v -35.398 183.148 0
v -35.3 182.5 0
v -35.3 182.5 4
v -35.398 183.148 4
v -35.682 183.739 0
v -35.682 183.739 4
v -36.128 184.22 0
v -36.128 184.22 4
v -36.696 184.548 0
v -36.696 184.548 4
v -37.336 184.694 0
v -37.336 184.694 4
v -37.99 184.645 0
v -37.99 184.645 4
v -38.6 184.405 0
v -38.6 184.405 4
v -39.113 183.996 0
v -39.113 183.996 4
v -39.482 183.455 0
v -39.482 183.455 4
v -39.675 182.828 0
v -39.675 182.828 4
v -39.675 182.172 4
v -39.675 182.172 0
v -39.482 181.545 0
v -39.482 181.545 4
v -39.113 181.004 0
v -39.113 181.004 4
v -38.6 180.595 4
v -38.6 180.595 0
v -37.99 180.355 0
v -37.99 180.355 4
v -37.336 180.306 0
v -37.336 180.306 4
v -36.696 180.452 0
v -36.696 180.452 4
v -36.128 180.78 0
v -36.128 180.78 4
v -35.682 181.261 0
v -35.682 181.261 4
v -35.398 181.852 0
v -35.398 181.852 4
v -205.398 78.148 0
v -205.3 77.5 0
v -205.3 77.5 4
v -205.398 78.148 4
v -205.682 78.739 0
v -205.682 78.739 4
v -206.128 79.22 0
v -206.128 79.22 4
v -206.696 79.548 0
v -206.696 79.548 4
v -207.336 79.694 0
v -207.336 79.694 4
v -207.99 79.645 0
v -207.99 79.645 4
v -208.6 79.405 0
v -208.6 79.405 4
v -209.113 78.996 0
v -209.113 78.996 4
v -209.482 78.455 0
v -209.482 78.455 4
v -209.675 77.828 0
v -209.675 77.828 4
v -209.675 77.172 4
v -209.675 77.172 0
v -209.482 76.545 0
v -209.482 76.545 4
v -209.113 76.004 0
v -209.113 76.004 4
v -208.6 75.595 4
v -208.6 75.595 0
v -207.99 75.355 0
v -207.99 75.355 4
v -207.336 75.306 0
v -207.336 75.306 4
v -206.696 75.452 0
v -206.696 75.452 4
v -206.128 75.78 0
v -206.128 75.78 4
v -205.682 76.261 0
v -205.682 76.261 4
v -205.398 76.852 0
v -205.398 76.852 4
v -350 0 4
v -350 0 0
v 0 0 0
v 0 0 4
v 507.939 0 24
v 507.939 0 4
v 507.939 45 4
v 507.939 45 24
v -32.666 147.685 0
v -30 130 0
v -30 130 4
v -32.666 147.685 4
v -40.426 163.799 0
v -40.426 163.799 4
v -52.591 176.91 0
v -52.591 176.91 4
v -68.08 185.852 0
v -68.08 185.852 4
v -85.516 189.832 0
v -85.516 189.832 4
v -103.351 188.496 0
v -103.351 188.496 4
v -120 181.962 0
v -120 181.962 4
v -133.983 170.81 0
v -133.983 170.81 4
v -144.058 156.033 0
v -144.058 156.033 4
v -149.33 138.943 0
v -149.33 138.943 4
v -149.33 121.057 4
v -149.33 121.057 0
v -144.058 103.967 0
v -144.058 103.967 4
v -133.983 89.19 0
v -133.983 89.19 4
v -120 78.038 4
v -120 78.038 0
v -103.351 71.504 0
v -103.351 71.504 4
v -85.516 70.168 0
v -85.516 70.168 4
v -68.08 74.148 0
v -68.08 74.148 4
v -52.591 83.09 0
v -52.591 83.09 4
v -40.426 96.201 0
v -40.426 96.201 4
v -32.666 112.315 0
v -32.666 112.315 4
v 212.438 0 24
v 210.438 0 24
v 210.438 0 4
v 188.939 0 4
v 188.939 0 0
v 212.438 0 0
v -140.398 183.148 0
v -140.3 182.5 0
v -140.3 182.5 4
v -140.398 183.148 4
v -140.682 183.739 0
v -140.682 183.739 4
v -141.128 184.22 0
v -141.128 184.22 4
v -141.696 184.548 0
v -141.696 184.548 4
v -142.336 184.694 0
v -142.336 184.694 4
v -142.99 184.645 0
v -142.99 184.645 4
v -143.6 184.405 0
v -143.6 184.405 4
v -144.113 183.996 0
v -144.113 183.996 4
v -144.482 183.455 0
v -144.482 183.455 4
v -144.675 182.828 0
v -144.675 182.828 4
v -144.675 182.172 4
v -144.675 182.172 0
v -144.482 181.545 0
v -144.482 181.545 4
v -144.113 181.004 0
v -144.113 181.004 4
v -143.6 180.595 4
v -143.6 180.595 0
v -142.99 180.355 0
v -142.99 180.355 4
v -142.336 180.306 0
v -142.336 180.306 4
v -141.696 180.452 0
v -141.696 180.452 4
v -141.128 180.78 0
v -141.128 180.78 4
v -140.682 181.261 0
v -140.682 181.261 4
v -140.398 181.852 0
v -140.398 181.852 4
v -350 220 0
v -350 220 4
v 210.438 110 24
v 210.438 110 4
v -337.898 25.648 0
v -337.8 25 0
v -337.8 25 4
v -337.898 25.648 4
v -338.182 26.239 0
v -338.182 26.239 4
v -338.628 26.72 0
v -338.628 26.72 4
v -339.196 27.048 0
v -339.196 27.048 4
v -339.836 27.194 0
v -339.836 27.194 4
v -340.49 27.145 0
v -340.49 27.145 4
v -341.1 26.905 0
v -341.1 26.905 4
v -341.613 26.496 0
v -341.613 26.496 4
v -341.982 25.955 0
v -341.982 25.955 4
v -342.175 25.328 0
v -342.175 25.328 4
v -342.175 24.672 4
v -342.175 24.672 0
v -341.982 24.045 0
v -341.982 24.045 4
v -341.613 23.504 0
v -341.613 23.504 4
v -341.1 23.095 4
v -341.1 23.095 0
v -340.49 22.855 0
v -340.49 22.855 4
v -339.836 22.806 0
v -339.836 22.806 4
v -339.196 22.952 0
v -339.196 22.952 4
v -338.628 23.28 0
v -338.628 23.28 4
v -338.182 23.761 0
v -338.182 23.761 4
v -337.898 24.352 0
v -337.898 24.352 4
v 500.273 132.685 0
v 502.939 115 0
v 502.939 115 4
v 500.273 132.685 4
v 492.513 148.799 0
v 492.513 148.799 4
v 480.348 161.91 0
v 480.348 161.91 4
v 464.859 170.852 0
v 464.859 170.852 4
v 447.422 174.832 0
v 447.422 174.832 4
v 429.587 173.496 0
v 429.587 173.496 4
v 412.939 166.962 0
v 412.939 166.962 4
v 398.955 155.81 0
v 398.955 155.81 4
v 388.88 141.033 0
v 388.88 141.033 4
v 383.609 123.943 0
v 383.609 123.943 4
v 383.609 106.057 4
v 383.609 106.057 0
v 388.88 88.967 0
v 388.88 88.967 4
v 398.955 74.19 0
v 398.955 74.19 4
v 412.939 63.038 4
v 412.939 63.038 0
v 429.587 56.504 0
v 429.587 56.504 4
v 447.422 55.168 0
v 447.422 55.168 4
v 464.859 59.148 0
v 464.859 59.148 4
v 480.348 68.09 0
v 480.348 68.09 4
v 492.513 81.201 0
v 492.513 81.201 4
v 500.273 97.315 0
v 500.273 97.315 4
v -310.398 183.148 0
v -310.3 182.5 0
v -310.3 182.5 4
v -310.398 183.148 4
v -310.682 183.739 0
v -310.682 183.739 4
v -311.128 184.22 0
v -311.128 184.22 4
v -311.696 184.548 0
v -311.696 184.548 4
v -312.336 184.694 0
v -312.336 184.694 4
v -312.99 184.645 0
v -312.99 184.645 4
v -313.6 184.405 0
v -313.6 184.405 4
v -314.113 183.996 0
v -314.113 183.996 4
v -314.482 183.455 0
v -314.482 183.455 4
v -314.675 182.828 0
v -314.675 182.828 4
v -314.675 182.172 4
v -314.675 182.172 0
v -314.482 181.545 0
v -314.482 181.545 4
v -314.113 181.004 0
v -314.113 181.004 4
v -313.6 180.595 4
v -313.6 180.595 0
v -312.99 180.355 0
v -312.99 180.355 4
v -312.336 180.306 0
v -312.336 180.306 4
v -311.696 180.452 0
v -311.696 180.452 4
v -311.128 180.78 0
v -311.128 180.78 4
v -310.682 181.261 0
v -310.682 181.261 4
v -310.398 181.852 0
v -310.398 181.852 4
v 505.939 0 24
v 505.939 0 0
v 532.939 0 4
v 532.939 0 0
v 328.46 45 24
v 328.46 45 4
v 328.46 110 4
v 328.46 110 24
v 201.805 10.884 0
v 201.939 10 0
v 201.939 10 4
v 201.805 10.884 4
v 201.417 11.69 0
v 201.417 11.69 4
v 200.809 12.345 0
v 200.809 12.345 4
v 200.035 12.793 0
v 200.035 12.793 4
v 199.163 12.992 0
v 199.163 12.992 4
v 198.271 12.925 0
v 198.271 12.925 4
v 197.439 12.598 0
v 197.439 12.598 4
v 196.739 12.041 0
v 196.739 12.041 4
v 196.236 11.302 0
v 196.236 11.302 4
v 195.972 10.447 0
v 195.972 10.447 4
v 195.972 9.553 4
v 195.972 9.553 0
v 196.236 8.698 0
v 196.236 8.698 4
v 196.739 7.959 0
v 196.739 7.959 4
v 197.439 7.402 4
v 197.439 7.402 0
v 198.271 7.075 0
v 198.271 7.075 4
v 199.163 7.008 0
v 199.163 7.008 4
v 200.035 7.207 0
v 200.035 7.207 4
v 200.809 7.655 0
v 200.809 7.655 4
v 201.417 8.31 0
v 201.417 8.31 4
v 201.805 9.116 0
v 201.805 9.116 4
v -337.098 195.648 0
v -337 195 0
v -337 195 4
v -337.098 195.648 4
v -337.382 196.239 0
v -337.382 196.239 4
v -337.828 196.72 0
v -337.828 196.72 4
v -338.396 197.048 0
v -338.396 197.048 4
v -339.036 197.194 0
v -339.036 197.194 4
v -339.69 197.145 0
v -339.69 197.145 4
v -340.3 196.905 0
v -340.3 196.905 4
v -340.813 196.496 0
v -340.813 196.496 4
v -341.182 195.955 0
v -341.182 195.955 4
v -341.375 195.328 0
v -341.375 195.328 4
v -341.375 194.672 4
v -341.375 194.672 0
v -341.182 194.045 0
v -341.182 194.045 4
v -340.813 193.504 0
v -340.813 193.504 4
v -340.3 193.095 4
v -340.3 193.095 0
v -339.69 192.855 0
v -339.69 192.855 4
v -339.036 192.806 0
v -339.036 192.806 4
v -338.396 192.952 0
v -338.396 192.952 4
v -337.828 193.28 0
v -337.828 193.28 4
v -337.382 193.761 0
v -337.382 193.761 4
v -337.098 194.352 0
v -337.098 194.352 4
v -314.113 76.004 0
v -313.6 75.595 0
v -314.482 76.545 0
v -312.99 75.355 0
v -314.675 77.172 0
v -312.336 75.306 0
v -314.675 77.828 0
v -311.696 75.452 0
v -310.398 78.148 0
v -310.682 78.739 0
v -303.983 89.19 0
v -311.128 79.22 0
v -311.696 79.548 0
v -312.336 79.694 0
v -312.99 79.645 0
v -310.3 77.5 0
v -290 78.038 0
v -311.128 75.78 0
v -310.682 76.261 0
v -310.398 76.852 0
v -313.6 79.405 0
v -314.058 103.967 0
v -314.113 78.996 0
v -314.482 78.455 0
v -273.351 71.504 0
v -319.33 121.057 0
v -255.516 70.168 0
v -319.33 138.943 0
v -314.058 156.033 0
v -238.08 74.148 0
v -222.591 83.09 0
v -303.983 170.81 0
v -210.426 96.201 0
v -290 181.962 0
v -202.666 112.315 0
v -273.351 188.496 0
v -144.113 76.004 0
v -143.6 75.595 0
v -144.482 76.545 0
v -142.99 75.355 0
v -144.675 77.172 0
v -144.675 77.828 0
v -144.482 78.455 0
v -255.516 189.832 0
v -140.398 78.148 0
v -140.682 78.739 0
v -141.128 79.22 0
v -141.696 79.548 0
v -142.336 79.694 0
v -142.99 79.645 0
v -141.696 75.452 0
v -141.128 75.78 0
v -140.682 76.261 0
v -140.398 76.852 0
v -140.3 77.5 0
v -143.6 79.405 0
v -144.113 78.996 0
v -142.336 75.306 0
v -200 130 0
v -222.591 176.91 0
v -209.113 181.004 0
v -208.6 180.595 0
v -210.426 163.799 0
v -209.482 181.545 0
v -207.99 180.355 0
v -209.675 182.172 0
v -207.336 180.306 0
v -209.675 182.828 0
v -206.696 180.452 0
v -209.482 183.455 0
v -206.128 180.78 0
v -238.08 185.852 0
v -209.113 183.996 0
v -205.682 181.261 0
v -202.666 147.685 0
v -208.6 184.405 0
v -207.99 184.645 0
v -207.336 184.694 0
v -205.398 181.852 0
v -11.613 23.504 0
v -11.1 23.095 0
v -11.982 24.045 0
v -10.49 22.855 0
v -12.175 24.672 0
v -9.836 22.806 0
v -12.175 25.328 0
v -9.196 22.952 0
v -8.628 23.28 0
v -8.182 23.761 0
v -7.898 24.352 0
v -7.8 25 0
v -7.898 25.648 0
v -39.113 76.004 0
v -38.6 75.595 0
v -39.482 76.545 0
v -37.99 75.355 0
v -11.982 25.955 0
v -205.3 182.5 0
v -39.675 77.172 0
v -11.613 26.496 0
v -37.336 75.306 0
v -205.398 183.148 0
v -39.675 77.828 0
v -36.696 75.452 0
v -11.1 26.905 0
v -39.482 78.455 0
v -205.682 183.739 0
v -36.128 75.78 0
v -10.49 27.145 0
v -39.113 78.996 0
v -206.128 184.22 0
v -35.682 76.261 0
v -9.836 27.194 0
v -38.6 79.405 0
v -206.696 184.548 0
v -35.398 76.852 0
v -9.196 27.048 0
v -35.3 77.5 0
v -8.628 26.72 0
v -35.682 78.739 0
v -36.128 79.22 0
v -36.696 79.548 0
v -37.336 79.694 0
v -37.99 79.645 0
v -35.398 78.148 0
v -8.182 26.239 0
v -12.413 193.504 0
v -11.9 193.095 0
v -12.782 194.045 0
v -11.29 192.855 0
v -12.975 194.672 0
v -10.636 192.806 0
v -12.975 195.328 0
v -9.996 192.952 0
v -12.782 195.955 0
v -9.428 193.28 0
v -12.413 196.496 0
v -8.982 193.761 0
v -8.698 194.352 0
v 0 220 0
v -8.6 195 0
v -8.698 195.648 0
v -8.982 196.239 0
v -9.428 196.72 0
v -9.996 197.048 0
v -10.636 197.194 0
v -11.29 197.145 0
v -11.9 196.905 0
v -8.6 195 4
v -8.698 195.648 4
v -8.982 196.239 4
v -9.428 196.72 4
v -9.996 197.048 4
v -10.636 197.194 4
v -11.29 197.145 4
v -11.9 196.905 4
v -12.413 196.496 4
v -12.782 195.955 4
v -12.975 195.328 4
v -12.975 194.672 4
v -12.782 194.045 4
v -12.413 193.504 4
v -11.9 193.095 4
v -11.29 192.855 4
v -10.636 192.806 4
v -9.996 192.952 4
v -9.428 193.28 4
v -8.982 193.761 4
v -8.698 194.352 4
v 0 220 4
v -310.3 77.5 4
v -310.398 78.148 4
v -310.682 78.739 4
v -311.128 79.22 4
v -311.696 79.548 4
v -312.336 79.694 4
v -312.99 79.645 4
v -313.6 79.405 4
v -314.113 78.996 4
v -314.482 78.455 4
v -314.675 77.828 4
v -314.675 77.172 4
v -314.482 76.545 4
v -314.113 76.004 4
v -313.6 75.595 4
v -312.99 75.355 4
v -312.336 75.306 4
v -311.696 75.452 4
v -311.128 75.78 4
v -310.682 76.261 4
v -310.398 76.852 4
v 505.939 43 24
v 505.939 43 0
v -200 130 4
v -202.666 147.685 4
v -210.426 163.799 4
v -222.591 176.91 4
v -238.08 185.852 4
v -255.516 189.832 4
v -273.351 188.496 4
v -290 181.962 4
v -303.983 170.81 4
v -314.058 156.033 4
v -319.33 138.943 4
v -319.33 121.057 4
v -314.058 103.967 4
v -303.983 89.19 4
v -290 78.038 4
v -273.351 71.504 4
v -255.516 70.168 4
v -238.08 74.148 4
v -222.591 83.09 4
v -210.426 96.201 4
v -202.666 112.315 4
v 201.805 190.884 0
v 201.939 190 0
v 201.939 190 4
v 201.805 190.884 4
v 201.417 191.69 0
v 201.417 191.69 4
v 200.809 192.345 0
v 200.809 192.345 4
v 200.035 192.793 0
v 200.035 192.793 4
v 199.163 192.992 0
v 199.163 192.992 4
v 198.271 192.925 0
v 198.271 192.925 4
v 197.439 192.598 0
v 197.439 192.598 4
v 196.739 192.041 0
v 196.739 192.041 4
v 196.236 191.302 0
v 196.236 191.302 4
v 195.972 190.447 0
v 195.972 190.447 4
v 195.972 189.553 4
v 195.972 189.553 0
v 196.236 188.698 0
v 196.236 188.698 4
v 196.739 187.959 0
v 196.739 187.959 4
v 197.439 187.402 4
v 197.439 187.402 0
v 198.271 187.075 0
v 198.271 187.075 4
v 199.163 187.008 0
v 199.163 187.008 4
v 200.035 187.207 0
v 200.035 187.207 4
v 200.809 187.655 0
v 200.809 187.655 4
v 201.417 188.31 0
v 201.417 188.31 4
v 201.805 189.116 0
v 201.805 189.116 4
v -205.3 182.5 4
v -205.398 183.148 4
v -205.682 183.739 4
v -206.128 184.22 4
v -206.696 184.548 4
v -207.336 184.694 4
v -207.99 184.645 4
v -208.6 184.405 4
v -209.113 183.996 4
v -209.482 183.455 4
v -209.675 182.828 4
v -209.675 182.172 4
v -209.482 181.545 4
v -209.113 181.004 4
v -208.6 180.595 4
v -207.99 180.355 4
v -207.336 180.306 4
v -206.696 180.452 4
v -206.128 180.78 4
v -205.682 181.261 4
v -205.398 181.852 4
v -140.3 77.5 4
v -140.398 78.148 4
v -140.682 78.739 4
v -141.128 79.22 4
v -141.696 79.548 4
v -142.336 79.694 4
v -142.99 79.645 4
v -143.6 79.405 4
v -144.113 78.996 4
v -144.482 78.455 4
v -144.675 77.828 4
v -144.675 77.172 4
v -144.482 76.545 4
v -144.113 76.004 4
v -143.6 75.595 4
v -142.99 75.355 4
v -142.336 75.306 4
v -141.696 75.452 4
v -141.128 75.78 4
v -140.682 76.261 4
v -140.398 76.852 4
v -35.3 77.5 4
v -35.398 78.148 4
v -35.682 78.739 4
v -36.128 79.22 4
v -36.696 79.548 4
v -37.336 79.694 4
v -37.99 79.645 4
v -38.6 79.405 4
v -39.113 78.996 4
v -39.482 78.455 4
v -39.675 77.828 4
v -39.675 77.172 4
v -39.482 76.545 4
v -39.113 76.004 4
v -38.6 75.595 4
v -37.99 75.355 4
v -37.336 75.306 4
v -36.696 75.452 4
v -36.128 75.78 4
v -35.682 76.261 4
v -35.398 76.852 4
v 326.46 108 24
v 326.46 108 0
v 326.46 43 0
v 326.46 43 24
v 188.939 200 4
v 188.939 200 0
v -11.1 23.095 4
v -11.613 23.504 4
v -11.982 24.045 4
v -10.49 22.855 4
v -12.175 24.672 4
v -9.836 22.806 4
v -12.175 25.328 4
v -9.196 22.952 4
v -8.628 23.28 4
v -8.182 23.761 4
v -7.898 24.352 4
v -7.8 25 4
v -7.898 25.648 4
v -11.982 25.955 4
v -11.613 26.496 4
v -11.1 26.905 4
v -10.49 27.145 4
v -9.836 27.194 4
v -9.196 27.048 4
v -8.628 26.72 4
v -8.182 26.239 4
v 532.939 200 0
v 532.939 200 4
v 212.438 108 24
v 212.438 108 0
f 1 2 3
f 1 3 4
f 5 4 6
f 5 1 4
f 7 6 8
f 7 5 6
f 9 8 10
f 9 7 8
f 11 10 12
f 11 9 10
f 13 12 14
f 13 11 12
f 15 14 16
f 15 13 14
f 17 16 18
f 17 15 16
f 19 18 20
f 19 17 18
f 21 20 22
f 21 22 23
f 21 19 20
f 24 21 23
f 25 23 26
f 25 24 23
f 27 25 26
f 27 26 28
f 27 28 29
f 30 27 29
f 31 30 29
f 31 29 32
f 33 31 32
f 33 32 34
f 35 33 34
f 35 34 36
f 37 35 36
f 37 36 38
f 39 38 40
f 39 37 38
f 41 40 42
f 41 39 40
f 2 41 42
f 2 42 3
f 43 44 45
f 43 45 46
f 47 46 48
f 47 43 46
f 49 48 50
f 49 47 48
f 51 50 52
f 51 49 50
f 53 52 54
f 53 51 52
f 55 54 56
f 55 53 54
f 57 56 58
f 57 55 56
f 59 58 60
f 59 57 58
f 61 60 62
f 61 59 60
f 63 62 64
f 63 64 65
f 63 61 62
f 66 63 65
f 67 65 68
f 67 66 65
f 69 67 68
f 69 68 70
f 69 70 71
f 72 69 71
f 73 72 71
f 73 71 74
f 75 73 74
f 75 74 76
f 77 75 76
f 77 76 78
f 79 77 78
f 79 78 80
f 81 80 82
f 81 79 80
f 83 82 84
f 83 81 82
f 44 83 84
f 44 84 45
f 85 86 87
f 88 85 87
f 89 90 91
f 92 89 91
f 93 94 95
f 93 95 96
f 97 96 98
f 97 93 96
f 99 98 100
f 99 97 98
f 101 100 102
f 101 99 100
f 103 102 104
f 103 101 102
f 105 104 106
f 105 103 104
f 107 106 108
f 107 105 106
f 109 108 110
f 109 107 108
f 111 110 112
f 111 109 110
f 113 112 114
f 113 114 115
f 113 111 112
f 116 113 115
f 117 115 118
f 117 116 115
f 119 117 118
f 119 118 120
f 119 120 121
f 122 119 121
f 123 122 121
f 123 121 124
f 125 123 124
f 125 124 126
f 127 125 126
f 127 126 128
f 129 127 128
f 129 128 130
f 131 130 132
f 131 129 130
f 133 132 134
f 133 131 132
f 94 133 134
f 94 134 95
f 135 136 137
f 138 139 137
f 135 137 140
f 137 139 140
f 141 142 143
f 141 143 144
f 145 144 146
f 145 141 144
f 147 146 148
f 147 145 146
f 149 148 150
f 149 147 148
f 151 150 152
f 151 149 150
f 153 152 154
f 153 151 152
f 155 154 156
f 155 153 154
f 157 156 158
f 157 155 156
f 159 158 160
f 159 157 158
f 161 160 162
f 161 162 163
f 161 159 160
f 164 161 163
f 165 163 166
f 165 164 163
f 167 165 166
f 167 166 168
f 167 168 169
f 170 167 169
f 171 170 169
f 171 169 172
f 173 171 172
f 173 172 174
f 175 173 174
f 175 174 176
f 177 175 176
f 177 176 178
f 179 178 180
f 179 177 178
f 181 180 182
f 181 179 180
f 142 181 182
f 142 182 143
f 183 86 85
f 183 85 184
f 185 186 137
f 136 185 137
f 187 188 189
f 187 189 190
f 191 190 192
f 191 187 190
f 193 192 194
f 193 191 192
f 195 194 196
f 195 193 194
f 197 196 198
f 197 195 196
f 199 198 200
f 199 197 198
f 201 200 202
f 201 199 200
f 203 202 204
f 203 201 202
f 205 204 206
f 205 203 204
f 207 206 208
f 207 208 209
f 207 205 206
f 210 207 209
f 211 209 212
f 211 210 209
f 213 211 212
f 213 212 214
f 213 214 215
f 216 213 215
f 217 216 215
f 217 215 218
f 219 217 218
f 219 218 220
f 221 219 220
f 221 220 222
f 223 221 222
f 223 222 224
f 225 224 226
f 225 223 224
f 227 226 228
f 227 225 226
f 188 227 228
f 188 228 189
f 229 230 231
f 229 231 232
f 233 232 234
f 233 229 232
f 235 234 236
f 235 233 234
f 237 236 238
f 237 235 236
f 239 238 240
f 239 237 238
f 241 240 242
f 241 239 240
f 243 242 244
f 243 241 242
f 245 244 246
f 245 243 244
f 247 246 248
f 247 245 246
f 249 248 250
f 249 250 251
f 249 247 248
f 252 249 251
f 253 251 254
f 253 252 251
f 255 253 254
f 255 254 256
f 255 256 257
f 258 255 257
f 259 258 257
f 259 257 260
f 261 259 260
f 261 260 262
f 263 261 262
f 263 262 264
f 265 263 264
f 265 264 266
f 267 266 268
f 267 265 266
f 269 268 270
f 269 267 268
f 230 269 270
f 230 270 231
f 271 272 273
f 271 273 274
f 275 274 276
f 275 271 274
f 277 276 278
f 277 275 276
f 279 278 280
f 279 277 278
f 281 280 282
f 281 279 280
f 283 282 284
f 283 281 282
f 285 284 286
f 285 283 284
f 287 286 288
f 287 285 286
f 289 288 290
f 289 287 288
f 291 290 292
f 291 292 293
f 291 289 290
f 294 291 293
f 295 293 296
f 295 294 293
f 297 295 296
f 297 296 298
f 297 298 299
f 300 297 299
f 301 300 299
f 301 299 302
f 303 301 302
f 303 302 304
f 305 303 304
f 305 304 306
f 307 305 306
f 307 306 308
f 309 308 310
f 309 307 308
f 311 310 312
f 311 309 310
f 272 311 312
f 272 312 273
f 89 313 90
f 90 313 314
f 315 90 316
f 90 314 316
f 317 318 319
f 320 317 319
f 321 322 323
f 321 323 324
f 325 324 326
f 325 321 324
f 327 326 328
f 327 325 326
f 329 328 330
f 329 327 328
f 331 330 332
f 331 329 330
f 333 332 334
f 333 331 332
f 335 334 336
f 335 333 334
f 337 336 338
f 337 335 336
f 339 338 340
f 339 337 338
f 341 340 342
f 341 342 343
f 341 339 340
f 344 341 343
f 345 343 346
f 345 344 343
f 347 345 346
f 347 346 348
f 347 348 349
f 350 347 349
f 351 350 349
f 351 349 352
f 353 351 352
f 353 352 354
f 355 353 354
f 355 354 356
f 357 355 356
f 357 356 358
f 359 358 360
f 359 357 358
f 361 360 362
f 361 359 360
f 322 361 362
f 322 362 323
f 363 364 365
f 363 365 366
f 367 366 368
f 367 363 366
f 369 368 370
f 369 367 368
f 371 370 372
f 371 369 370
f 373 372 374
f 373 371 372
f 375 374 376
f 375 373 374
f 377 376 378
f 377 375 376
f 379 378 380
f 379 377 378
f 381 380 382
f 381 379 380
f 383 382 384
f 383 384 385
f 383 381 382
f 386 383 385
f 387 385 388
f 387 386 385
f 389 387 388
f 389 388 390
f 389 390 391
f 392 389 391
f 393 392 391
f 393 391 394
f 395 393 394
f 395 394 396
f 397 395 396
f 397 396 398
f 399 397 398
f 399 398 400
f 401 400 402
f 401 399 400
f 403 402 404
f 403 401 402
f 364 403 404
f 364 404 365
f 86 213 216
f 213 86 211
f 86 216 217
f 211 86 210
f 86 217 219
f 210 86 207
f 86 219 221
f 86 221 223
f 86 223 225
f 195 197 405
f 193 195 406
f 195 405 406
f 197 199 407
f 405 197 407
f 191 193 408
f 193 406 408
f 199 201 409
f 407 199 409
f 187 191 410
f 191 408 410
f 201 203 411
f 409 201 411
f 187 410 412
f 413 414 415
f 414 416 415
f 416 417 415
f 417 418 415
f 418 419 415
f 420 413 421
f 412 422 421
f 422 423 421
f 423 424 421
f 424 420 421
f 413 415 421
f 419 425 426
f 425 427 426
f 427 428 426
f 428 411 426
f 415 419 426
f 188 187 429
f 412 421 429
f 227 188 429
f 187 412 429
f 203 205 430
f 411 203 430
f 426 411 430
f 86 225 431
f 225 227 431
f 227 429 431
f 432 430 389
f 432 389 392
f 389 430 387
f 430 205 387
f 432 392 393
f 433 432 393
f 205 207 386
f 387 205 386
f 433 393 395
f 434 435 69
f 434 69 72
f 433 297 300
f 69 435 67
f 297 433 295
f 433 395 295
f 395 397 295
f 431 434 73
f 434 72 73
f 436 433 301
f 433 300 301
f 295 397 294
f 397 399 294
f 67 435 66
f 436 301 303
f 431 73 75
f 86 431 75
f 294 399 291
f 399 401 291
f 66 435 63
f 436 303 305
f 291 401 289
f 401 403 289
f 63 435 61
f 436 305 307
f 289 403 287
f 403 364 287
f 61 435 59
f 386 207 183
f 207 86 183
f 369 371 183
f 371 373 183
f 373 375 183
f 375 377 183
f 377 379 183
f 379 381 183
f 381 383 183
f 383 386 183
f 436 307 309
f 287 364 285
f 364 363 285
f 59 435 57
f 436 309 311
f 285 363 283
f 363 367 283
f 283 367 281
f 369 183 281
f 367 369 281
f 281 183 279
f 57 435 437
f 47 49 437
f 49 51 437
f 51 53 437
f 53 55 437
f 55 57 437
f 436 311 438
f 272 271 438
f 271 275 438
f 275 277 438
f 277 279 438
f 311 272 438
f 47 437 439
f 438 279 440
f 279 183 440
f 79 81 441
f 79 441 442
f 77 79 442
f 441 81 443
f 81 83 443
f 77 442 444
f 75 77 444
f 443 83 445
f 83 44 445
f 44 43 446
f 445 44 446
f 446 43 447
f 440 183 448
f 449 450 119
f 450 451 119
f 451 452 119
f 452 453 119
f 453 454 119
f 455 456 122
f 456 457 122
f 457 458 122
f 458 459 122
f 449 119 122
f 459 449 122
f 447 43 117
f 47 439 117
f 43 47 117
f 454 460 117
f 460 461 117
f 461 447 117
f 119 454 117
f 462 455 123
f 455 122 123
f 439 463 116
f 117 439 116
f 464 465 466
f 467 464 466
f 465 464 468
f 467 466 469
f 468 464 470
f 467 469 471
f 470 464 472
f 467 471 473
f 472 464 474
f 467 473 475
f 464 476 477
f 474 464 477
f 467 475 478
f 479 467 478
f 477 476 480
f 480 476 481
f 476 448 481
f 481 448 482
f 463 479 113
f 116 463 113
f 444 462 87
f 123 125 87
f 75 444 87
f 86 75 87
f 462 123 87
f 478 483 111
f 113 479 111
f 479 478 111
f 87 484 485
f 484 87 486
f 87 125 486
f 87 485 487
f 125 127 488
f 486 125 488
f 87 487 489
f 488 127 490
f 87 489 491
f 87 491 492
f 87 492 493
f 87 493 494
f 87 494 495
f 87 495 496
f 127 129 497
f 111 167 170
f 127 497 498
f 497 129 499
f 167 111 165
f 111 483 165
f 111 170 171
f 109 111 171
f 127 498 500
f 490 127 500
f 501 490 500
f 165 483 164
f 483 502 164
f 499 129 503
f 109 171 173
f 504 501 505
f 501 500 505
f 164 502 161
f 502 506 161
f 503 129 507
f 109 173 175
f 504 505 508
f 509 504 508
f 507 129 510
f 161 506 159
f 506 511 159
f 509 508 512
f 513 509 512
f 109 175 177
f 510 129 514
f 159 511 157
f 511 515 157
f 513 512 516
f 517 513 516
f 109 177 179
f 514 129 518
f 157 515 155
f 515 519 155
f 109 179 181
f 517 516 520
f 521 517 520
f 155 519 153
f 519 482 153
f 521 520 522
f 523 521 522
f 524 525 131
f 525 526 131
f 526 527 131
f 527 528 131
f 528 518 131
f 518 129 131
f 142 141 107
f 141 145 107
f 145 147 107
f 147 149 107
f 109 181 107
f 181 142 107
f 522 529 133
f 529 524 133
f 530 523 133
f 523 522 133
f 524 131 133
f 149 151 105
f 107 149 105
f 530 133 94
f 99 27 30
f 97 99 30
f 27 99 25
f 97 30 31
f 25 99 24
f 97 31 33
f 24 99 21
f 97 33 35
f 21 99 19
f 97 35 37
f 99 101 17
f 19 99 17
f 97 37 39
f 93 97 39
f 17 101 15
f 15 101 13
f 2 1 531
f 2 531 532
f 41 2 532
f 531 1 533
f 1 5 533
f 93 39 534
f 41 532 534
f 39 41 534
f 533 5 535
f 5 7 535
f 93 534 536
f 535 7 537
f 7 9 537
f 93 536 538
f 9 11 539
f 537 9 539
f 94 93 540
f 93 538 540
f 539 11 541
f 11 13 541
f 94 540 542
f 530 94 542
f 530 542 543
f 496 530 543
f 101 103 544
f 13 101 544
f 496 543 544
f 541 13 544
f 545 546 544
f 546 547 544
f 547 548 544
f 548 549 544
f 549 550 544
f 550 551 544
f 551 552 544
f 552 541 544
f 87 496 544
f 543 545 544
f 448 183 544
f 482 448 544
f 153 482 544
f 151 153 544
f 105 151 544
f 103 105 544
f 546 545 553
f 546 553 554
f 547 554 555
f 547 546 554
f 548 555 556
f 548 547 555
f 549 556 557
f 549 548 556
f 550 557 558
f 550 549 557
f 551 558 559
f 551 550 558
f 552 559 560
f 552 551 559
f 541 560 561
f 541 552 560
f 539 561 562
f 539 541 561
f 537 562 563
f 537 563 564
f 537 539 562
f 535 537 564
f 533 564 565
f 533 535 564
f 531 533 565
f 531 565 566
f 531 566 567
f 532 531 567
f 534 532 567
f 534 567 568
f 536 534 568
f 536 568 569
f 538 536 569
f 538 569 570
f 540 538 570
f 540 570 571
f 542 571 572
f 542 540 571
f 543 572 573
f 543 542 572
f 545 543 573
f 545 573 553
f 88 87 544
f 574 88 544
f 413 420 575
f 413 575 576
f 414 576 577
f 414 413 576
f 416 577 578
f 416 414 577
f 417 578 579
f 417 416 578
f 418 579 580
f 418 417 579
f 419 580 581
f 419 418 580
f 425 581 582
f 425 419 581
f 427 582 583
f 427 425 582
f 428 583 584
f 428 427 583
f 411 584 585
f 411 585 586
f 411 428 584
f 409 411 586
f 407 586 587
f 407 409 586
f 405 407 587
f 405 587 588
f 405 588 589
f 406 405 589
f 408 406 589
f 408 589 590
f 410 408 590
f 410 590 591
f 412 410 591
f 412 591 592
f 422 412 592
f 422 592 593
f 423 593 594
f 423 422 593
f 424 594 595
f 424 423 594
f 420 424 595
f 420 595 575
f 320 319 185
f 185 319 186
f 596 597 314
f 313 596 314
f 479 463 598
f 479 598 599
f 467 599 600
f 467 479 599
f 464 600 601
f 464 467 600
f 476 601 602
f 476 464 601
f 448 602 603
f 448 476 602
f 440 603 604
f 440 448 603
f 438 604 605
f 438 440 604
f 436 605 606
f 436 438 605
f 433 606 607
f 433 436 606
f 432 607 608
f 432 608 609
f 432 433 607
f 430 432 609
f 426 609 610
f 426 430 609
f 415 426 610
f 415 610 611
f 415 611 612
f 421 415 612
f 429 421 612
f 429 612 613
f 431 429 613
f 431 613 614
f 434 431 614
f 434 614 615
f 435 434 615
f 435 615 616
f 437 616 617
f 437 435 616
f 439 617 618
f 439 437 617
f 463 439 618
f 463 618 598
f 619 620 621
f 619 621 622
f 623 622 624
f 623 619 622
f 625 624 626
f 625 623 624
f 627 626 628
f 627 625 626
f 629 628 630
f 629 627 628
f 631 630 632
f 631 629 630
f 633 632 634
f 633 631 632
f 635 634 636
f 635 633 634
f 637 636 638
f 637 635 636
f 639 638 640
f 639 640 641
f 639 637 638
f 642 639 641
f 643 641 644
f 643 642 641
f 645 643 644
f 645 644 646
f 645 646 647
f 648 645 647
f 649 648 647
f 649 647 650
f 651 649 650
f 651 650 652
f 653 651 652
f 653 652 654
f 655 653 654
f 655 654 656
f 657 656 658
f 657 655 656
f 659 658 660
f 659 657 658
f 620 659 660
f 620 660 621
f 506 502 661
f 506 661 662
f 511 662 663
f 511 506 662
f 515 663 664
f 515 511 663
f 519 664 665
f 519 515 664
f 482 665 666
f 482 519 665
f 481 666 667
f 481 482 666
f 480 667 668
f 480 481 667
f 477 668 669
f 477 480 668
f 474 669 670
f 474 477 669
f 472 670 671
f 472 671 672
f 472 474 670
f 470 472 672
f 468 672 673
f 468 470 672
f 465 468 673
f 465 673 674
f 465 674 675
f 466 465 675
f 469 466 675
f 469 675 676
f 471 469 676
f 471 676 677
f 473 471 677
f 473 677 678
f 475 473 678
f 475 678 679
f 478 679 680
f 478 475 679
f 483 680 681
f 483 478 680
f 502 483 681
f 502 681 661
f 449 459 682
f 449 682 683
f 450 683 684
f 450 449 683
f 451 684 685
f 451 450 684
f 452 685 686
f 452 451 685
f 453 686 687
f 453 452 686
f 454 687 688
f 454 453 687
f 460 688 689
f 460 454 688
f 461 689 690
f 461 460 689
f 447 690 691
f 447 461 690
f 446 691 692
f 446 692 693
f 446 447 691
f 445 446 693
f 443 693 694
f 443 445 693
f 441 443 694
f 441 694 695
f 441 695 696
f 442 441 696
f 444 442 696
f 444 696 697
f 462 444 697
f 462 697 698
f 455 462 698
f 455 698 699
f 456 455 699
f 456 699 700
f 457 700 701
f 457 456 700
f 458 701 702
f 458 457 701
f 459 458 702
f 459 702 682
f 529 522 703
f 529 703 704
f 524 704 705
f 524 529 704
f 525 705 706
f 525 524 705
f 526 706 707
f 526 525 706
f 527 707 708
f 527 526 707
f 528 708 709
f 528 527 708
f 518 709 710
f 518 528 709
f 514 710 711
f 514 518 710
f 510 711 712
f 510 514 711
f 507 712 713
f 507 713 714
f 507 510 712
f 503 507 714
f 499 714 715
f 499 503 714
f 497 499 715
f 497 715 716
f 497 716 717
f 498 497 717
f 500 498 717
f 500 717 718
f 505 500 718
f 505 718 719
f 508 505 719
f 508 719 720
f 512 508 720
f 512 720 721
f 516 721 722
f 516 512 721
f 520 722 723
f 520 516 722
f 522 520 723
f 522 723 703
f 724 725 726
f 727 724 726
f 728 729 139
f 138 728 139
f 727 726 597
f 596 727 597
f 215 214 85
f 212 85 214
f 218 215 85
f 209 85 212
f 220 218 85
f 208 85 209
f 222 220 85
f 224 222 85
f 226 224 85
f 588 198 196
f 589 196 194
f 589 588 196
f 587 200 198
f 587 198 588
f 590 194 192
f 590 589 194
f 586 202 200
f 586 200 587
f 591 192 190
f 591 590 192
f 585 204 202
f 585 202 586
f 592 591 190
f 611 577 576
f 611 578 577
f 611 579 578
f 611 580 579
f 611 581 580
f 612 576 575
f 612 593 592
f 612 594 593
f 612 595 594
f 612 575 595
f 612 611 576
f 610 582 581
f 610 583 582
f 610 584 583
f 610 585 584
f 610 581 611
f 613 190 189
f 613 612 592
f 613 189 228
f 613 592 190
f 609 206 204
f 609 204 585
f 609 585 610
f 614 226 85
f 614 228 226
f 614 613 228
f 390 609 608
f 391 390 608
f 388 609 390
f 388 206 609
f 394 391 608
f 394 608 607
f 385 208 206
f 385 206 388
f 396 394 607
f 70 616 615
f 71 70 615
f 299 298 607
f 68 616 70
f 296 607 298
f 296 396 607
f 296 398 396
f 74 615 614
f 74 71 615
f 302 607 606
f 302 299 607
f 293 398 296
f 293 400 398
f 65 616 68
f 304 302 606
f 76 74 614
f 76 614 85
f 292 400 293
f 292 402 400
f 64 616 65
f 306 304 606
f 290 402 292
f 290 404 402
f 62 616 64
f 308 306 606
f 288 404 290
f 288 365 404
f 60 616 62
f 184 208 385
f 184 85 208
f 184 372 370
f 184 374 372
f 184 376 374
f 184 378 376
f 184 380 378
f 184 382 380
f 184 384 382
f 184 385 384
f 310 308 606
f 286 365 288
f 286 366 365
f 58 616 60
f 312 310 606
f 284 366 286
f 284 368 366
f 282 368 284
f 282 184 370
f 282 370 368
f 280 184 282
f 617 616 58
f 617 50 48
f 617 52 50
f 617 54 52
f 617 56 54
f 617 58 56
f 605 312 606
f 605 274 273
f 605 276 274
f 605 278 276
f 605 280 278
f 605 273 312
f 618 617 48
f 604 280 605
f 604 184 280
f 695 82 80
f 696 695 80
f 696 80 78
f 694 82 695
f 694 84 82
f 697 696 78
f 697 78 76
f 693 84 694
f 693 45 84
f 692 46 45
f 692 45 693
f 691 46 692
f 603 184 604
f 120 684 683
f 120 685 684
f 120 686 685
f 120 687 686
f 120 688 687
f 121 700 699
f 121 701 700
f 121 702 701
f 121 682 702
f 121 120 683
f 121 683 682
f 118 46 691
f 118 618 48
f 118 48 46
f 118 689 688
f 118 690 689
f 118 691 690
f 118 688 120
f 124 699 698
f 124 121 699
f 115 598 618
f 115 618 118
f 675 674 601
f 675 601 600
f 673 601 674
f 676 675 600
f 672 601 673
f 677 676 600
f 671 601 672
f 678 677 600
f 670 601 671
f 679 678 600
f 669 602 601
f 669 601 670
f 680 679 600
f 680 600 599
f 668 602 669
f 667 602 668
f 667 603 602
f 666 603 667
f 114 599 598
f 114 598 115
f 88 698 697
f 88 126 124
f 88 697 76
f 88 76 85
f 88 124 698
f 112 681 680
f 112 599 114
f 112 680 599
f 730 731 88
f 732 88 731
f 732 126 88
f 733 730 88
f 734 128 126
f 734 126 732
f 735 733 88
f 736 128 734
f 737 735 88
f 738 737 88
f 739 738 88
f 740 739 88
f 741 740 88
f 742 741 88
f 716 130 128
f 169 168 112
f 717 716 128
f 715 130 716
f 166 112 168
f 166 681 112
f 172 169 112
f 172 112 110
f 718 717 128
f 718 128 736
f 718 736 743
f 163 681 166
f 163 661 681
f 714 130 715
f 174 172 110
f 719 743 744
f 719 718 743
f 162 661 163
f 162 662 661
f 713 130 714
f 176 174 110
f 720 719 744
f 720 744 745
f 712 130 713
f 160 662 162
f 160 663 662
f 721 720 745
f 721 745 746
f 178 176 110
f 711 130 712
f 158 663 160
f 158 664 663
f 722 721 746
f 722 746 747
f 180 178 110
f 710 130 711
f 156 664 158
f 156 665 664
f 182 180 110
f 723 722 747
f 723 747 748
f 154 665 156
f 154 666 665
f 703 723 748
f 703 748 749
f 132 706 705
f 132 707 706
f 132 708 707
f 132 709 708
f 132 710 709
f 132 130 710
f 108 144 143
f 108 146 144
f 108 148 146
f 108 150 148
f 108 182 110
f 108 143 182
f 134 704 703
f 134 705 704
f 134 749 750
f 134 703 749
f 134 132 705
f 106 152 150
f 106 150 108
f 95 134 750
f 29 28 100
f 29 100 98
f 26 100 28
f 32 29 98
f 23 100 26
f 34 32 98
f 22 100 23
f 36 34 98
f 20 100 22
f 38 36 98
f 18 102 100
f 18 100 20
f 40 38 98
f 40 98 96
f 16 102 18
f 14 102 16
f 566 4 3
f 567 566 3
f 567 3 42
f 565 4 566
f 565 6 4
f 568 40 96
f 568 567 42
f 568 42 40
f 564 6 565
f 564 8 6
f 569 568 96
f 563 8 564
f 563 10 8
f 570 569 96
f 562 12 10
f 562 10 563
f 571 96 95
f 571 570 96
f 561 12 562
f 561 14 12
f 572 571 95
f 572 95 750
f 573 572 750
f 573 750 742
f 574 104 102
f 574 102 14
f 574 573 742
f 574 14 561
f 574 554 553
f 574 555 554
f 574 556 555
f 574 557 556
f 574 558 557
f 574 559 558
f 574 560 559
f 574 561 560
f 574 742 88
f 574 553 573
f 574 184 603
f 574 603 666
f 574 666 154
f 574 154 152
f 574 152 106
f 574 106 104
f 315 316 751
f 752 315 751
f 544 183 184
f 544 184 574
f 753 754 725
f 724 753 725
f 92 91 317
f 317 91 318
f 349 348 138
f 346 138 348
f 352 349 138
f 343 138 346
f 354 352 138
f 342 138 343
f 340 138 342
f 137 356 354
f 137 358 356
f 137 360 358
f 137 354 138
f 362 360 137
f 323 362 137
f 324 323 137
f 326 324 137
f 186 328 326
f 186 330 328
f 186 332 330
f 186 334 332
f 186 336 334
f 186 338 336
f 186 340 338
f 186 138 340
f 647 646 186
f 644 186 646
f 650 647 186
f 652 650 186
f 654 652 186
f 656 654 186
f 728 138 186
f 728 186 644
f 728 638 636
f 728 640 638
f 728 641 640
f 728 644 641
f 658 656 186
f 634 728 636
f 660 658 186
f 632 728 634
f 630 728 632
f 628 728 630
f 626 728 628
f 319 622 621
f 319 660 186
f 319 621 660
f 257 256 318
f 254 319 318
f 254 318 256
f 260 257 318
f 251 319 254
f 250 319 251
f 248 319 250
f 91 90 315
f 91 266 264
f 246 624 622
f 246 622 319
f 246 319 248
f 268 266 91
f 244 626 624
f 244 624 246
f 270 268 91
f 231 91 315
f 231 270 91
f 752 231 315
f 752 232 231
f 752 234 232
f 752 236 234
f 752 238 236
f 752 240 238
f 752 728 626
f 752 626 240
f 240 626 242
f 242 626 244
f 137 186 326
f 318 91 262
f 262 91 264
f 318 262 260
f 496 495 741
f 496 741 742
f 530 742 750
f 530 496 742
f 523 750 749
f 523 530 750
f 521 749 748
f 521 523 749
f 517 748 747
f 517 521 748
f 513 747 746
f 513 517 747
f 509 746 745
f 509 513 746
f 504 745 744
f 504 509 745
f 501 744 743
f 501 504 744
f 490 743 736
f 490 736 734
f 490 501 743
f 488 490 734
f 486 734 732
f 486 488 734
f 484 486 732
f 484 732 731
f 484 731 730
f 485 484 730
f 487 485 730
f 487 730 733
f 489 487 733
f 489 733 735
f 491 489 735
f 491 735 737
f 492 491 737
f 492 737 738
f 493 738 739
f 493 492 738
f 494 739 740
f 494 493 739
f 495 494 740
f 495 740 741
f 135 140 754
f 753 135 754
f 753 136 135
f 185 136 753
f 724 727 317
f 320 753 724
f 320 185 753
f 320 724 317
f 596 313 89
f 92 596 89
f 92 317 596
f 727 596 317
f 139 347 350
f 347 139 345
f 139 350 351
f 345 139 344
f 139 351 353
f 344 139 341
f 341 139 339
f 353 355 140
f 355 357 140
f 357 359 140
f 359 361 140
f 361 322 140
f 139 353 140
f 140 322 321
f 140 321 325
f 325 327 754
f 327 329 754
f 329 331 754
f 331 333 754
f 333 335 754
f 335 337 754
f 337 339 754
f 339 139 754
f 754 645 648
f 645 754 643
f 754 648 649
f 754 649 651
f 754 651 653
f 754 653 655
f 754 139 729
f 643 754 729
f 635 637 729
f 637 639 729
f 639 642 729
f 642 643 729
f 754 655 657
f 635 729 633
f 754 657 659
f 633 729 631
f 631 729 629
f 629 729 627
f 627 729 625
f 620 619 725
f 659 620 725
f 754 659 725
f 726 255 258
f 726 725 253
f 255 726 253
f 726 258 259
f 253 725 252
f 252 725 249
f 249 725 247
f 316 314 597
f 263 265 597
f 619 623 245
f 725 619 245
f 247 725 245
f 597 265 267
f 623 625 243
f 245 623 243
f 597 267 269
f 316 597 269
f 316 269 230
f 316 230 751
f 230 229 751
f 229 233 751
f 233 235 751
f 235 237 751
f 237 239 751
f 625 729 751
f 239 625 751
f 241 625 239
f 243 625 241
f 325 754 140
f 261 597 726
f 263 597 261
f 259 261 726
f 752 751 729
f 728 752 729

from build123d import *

# Parameters (mm, degrees)
F0_W     = 350
F0_H     = 220
F0_R     = 2.2
F0_R_2   = 60
F1_DEPTH = 4
F2_R     = 3
F2_R_2   = 60
F3_DEPTH = 4
F4_DEPTH = 24


with BuildPart() as f1:
    # F0 (on Top) → F1 (new body)
    with BuildSketch(Plane.XY):
        with Locations((-175, 110)):
            Rectangle(F0_W, F0_H)
        with Locations((-340, 25)):
            Circle(F0_R, mode=Mode.SUBTRACT)
        with Locations((-312.5, 77.5)):
            Circle(F0_R, mode=Mode.SUBTRACT)
        with Locations((-207.5, 77.5)):
            Circle(F0_R, mode=Mode.SUBTRACT)
        with Locations((-10, 25)):
            Circle(F0_R, mode=Mode.SUBTRACT)
        with Locations((-142.5, 77.5)):
            Circle(F0_R, mode=Mode.SUBTRACT)
        with Locations((-37.5, 77.5)):
            Circle(F0_R, mode=Mode.SUBTRACT)
        with Locations((-260, 130)):
            Circle(F0_R_2, mode=Mode.SUBTRACT)
        with Locations((-312.5, 182.5)):
            Circle(F0_R, mode=Mode.SUBTRACT)
        with Locations((-339.2, 195)):
            Circle(F0_R, mode=Mode.SUBTRACT)
        with Locations((-207.5, 182.5)):
            Circle(F0_R, mode=Mode.SUBTRACT)
        with Locations((-90, 130)):
            Circle(F0_R_2, mode=Mode.SUBTRACT)
        with Locations((-142.5, 182.5)):
            Circle(F0_R, mode=Mode.SUBTRACT)
        with Locations((-37.5, 182.5)):
            Circle(F0_R, mode=Mode.SUBTRACT)
        with Locations((-10.8, 195)):
            Circle(F0_R, mode=Mode.SUBTRACT)
    extrude(amount=F1_DEPTH)


with BuildPart() as f3:
    # F2 (on Top) → F3 (new body)
    with BuildSketch(Plane.XY):
        Polygon((507.938528, 0), (532.938528, 0), (532.938528, 200), (188.938528, 200), (188.938528, 0), (210.437715, 0), (210.437715, 110), (328.460153, 110), (328.460153, 45), (507.938528, 45), align=None)
        with Locations((198.938528, 10)):
            Circle(F2_R, mode=Mode.SUBTRACT)
        with Locations((198.938528, 190)):
            Circle(F2_R, mode=Mode.SUBTRACT)
        with Locations((442.938528, 115)):
            Circle(F2_R_2, mode=Mode.SUBTRACT)
    extrude(amount=F3_DEPTH)

    # F2 (on Top) → F4 (join)
    with BuildSketch(Plane.XY):
        Polygon((505.938528, 0), (507.938528, 0), (507.938528, 45), (328.460153, 45), (328.460153, 110), (210.437715, 110), (210.437715, 0), (212.437715, 0), (212.437715, 108), (326.460153, 108), (326.460153, 43), (505.938528, 43), (505.938528, 2.999995), align=None)
    extrude(amount=F4_DEPTH)


solid = Compound([f1.part, f3.part])
